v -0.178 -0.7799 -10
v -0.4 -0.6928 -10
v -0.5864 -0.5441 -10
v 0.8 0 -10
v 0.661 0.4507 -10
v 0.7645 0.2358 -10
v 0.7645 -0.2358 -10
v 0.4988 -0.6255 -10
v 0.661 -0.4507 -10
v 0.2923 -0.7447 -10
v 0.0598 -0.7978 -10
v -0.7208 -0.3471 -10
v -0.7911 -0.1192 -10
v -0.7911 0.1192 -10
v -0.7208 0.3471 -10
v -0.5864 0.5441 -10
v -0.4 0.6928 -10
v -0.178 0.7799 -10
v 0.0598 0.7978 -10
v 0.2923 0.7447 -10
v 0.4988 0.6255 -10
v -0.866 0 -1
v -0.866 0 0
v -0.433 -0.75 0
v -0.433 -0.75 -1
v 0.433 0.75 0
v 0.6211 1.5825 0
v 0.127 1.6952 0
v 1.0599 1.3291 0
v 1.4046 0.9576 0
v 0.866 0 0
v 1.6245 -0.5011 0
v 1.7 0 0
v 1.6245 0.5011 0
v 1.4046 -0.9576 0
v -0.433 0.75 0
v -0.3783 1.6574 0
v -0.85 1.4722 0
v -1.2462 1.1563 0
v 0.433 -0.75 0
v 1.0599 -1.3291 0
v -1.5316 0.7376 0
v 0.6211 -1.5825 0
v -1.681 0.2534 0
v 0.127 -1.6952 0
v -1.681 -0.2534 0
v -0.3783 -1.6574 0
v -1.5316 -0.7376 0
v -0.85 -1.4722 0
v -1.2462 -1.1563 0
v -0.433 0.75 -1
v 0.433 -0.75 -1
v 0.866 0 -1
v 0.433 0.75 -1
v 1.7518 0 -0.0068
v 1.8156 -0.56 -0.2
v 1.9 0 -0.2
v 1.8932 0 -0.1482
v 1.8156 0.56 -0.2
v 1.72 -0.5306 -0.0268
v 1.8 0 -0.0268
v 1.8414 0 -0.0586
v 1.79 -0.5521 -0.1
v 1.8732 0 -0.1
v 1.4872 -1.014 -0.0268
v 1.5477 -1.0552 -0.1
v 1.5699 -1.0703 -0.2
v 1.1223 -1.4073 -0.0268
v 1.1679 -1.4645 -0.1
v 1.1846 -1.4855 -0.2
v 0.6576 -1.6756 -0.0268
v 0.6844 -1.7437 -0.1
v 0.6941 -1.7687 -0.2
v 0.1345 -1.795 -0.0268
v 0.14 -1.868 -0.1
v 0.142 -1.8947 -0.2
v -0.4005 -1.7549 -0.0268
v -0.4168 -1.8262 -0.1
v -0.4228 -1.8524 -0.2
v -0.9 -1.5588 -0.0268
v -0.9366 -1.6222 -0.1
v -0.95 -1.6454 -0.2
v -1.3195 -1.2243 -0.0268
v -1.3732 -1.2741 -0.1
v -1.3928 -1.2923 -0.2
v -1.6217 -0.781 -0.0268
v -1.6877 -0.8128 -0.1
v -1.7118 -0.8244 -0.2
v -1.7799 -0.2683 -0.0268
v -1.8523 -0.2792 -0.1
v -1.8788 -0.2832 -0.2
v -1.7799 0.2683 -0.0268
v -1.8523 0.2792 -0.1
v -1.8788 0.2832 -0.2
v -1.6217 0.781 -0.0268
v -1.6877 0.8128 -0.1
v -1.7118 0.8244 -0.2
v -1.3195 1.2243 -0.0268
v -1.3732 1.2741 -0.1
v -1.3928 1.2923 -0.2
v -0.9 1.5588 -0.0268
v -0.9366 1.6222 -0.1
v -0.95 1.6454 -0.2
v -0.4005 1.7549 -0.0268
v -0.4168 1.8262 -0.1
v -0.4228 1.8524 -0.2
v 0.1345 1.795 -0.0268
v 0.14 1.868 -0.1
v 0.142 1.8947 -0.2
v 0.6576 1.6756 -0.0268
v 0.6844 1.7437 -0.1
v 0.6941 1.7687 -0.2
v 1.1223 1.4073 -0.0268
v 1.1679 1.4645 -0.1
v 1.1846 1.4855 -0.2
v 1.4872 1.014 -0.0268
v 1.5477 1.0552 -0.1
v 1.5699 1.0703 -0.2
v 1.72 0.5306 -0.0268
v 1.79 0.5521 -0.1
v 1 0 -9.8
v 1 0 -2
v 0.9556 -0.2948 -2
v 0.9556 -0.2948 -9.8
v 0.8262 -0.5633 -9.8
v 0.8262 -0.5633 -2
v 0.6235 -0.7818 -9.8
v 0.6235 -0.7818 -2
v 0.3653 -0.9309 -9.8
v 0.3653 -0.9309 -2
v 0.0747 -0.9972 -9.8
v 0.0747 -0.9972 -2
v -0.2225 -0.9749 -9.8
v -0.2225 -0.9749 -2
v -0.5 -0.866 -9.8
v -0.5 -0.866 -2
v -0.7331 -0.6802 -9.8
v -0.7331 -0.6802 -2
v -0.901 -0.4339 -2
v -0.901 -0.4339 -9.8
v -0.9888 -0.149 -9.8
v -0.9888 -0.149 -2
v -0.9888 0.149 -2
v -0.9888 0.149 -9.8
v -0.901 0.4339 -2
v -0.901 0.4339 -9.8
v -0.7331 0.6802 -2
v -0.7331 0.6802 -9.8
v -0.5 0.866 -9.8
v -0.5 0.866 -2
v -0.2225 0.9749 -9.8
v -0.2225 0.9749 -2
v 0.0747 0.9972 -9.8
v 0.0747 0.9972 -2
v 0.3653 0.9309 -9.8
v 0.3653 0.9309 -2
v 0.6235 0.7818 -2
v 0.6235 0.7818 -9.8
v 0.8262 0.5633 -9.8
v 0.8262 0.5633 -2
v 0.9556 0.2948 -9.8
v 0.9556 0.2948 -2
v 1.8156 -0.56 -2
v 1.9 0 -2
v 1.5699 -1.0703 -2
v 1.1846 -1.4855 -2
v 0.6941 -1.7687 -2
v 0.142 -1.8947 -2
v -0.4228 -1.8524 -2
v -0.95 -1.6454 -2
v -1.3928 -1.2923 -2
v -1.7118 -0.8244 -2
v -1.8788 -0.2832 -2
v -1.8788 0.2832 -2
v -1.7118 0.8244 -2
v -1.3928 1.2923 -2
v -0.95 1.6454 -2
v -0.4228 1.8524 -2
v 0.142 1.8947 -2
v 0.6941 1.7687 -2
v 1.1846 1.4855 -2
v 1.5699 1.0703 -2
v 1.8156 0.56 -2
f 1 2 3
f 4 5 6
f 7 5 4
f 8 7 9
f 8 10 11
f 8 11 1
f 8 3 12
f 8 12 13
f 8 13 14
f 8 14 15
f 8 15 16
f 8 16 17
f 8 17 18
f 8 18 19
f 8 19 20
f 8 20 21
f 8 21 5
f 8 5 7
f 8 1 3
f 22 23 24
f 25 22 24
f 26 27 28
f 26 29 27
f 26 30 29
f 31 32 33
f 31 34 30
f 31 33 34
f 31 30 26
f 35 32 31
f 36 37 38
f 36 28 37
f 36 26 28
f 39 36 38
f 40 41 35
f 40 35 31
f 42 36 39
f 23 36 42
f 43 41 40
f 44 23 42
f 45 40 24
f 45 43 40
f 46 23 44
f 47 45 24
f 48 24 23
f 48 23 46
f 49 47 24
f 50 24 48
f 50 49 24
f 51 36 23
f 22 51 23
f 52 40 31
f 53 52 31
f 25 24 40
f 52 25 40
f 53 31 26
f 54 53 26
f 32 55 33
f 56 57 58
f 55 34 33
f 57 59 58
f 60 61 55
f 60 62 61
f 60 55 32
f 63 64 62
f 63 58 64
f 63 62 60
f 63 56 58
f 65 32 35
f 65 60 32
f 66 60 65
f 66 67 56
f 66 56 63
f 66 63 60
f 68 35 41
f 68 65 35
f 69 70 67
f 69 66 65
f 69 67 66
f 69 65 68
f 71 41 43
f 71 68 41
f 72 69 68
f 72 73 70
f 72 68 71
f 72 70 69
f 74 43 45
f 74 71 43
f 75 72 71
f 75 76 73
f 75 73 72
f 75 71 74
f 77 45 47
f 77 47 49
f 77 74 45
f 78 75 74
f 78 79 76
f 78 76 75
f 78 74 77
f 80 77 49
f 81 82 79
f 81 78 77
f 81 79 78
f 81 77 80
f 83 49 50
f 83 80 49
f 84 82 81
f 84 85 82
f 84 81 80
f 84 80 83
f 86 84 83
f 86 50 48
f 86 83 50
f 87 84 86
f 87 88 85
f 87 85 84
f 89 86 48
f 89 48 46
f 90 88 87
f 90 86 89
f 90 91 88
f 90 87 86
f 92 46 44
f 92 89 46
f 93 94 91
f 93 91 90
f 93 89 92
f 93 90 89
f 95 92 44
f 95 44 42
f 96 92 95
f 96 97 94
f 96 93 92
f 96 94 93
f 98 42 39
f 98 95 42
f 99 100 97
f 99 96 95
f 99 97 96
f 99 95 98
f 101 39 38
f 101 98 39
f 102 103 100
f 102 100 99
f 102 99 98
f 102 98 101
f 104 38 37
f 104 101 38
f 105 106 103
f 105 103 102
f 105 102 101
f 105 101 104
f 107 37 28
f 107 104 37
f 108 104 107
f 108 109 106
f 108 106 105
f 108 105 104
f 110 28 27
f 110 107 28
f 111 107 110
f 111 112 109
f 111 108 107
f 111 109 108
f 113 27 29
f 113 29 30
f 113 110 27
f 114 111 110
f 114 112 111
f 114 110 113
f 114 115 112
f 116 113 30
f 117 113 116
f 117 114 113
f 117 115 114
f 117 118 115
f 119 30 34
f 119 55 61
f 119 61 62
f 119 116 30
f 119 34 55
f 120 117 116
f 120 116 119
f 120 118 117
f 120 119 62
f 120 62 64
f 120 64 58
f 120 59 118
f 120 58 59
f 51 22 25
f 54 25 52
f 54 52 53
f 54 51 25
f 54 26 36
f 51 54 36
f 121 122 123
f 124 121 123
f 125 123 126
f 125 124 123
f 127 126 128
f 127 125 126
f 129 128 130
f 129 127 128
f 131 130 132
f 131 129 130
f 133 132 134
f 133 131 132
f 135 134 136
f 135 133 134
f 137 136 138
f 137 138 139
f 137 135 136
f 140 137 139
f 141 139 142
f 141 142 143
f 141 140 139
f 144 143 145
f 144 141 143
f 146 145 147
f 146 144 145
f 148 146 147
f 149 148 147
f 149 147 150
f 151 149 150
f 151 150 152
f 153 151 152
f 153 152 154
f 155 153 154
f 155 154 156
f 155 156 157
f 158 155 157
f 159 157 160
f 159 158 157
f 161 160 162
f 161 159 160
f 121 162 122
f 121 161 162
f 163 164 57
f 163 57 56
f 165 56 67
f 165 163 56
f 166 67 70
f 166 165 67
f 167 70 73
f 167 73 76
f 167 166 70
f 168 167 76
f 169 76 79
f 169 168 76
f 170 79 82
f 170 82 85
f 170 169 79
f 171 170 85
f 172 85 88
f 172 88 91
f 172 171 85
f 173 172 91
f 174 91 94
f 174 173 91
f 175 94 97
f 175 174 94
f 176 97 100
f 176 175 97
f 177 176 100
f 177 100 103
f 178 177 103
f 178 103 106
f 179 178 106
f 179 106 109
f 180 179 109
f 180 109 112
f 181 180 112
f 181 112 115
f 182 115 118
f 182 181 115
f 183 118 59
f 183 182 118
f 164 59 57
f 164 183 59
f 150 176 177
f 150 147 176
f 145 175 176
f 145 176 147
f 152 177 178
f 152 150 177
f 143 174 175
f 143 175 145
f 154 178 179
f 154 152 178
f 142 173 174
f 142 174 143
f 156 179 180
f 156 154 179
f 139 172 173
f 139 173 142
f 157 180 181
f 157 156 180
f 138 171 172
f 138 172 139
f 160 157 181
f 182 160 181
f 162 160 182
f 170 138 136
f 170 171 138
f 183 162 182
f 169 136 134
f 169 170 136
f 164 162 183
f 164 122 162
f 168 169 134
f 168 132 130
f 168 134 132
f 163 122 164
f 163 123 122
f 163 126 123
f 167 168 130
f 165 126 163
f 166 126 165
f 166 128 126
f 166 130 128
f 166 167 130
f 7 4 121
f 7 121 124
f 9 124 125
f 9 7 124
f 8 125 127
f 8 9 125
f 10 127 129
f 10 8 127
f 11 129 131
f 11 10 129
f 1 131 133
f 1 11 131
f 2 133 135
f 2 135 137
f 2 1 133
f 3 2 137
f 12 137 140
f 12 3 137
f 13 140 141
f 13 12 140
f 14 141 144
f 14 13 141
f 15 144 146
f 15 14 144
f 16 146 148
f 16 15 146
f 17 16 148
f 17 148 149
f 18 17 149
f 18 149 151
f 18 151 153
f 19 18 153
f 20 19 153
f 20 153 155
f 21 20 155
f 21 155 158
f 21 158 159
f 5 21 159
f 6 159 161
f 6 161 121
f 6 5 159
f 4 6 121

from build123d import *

# Parameters (mm, degrees)
EXTRUDE1_DEPTH = 1
FILLET1_R      = 0.2
CHAMFER_1_SIZE = 0.2


with BuildPart() as part:
    # Sketch2 → Matrix-Rotate1 (revolve)
    with BuildSketch(Plane(origin=(0, 0, 0), x_dir=(0, 0, -1), z_dir=(1, 0, 0)), mode=Mode.PRIVATE) as matrix_rotate1_sk:
        Polygon((0, 0), (0, 1.9), (2, 1.9), (2, 1), (10, 1), (10, 0), align=None)
    revolve(matrix_rotate1_sk.sketch.rotate(Axis((0, 0, 0), (0, 0, -1)), 90), axis=Axis((0, 0, 0), (0, 0, -1)))

    # Sketch3 → Extrude1 (cut)
    with BuildSketch(Plane.XY):
        Polygon((0.866025404, 0), (0.433012702, 0.75), (-0.433012702, 0.75), (-0.866025404, 0), (-0.433012702, -0.75), (0.433012702, -0.75), align=None)
    extrude(amount=-EXTRUDE1_DEPTH, mode=Mode.SUBTRACT)

    # Fillet1
    fillet1_edges = [part.edges().sort_by_distance(p)[0] for p in [
        (-1.9, 0, 0),
    ]]
    fillet(fillet1_edges, radius=FILLET1_R)

    # 倒角1
    chamfer_1_edges = [part.edges().sort_by_distance(p)[0] for p in [
        (-1, 0, -10),
    ]]
    chamfer(chamfer_1_edges, length=CHAMFER_1_SIZE)


solid = part.part
